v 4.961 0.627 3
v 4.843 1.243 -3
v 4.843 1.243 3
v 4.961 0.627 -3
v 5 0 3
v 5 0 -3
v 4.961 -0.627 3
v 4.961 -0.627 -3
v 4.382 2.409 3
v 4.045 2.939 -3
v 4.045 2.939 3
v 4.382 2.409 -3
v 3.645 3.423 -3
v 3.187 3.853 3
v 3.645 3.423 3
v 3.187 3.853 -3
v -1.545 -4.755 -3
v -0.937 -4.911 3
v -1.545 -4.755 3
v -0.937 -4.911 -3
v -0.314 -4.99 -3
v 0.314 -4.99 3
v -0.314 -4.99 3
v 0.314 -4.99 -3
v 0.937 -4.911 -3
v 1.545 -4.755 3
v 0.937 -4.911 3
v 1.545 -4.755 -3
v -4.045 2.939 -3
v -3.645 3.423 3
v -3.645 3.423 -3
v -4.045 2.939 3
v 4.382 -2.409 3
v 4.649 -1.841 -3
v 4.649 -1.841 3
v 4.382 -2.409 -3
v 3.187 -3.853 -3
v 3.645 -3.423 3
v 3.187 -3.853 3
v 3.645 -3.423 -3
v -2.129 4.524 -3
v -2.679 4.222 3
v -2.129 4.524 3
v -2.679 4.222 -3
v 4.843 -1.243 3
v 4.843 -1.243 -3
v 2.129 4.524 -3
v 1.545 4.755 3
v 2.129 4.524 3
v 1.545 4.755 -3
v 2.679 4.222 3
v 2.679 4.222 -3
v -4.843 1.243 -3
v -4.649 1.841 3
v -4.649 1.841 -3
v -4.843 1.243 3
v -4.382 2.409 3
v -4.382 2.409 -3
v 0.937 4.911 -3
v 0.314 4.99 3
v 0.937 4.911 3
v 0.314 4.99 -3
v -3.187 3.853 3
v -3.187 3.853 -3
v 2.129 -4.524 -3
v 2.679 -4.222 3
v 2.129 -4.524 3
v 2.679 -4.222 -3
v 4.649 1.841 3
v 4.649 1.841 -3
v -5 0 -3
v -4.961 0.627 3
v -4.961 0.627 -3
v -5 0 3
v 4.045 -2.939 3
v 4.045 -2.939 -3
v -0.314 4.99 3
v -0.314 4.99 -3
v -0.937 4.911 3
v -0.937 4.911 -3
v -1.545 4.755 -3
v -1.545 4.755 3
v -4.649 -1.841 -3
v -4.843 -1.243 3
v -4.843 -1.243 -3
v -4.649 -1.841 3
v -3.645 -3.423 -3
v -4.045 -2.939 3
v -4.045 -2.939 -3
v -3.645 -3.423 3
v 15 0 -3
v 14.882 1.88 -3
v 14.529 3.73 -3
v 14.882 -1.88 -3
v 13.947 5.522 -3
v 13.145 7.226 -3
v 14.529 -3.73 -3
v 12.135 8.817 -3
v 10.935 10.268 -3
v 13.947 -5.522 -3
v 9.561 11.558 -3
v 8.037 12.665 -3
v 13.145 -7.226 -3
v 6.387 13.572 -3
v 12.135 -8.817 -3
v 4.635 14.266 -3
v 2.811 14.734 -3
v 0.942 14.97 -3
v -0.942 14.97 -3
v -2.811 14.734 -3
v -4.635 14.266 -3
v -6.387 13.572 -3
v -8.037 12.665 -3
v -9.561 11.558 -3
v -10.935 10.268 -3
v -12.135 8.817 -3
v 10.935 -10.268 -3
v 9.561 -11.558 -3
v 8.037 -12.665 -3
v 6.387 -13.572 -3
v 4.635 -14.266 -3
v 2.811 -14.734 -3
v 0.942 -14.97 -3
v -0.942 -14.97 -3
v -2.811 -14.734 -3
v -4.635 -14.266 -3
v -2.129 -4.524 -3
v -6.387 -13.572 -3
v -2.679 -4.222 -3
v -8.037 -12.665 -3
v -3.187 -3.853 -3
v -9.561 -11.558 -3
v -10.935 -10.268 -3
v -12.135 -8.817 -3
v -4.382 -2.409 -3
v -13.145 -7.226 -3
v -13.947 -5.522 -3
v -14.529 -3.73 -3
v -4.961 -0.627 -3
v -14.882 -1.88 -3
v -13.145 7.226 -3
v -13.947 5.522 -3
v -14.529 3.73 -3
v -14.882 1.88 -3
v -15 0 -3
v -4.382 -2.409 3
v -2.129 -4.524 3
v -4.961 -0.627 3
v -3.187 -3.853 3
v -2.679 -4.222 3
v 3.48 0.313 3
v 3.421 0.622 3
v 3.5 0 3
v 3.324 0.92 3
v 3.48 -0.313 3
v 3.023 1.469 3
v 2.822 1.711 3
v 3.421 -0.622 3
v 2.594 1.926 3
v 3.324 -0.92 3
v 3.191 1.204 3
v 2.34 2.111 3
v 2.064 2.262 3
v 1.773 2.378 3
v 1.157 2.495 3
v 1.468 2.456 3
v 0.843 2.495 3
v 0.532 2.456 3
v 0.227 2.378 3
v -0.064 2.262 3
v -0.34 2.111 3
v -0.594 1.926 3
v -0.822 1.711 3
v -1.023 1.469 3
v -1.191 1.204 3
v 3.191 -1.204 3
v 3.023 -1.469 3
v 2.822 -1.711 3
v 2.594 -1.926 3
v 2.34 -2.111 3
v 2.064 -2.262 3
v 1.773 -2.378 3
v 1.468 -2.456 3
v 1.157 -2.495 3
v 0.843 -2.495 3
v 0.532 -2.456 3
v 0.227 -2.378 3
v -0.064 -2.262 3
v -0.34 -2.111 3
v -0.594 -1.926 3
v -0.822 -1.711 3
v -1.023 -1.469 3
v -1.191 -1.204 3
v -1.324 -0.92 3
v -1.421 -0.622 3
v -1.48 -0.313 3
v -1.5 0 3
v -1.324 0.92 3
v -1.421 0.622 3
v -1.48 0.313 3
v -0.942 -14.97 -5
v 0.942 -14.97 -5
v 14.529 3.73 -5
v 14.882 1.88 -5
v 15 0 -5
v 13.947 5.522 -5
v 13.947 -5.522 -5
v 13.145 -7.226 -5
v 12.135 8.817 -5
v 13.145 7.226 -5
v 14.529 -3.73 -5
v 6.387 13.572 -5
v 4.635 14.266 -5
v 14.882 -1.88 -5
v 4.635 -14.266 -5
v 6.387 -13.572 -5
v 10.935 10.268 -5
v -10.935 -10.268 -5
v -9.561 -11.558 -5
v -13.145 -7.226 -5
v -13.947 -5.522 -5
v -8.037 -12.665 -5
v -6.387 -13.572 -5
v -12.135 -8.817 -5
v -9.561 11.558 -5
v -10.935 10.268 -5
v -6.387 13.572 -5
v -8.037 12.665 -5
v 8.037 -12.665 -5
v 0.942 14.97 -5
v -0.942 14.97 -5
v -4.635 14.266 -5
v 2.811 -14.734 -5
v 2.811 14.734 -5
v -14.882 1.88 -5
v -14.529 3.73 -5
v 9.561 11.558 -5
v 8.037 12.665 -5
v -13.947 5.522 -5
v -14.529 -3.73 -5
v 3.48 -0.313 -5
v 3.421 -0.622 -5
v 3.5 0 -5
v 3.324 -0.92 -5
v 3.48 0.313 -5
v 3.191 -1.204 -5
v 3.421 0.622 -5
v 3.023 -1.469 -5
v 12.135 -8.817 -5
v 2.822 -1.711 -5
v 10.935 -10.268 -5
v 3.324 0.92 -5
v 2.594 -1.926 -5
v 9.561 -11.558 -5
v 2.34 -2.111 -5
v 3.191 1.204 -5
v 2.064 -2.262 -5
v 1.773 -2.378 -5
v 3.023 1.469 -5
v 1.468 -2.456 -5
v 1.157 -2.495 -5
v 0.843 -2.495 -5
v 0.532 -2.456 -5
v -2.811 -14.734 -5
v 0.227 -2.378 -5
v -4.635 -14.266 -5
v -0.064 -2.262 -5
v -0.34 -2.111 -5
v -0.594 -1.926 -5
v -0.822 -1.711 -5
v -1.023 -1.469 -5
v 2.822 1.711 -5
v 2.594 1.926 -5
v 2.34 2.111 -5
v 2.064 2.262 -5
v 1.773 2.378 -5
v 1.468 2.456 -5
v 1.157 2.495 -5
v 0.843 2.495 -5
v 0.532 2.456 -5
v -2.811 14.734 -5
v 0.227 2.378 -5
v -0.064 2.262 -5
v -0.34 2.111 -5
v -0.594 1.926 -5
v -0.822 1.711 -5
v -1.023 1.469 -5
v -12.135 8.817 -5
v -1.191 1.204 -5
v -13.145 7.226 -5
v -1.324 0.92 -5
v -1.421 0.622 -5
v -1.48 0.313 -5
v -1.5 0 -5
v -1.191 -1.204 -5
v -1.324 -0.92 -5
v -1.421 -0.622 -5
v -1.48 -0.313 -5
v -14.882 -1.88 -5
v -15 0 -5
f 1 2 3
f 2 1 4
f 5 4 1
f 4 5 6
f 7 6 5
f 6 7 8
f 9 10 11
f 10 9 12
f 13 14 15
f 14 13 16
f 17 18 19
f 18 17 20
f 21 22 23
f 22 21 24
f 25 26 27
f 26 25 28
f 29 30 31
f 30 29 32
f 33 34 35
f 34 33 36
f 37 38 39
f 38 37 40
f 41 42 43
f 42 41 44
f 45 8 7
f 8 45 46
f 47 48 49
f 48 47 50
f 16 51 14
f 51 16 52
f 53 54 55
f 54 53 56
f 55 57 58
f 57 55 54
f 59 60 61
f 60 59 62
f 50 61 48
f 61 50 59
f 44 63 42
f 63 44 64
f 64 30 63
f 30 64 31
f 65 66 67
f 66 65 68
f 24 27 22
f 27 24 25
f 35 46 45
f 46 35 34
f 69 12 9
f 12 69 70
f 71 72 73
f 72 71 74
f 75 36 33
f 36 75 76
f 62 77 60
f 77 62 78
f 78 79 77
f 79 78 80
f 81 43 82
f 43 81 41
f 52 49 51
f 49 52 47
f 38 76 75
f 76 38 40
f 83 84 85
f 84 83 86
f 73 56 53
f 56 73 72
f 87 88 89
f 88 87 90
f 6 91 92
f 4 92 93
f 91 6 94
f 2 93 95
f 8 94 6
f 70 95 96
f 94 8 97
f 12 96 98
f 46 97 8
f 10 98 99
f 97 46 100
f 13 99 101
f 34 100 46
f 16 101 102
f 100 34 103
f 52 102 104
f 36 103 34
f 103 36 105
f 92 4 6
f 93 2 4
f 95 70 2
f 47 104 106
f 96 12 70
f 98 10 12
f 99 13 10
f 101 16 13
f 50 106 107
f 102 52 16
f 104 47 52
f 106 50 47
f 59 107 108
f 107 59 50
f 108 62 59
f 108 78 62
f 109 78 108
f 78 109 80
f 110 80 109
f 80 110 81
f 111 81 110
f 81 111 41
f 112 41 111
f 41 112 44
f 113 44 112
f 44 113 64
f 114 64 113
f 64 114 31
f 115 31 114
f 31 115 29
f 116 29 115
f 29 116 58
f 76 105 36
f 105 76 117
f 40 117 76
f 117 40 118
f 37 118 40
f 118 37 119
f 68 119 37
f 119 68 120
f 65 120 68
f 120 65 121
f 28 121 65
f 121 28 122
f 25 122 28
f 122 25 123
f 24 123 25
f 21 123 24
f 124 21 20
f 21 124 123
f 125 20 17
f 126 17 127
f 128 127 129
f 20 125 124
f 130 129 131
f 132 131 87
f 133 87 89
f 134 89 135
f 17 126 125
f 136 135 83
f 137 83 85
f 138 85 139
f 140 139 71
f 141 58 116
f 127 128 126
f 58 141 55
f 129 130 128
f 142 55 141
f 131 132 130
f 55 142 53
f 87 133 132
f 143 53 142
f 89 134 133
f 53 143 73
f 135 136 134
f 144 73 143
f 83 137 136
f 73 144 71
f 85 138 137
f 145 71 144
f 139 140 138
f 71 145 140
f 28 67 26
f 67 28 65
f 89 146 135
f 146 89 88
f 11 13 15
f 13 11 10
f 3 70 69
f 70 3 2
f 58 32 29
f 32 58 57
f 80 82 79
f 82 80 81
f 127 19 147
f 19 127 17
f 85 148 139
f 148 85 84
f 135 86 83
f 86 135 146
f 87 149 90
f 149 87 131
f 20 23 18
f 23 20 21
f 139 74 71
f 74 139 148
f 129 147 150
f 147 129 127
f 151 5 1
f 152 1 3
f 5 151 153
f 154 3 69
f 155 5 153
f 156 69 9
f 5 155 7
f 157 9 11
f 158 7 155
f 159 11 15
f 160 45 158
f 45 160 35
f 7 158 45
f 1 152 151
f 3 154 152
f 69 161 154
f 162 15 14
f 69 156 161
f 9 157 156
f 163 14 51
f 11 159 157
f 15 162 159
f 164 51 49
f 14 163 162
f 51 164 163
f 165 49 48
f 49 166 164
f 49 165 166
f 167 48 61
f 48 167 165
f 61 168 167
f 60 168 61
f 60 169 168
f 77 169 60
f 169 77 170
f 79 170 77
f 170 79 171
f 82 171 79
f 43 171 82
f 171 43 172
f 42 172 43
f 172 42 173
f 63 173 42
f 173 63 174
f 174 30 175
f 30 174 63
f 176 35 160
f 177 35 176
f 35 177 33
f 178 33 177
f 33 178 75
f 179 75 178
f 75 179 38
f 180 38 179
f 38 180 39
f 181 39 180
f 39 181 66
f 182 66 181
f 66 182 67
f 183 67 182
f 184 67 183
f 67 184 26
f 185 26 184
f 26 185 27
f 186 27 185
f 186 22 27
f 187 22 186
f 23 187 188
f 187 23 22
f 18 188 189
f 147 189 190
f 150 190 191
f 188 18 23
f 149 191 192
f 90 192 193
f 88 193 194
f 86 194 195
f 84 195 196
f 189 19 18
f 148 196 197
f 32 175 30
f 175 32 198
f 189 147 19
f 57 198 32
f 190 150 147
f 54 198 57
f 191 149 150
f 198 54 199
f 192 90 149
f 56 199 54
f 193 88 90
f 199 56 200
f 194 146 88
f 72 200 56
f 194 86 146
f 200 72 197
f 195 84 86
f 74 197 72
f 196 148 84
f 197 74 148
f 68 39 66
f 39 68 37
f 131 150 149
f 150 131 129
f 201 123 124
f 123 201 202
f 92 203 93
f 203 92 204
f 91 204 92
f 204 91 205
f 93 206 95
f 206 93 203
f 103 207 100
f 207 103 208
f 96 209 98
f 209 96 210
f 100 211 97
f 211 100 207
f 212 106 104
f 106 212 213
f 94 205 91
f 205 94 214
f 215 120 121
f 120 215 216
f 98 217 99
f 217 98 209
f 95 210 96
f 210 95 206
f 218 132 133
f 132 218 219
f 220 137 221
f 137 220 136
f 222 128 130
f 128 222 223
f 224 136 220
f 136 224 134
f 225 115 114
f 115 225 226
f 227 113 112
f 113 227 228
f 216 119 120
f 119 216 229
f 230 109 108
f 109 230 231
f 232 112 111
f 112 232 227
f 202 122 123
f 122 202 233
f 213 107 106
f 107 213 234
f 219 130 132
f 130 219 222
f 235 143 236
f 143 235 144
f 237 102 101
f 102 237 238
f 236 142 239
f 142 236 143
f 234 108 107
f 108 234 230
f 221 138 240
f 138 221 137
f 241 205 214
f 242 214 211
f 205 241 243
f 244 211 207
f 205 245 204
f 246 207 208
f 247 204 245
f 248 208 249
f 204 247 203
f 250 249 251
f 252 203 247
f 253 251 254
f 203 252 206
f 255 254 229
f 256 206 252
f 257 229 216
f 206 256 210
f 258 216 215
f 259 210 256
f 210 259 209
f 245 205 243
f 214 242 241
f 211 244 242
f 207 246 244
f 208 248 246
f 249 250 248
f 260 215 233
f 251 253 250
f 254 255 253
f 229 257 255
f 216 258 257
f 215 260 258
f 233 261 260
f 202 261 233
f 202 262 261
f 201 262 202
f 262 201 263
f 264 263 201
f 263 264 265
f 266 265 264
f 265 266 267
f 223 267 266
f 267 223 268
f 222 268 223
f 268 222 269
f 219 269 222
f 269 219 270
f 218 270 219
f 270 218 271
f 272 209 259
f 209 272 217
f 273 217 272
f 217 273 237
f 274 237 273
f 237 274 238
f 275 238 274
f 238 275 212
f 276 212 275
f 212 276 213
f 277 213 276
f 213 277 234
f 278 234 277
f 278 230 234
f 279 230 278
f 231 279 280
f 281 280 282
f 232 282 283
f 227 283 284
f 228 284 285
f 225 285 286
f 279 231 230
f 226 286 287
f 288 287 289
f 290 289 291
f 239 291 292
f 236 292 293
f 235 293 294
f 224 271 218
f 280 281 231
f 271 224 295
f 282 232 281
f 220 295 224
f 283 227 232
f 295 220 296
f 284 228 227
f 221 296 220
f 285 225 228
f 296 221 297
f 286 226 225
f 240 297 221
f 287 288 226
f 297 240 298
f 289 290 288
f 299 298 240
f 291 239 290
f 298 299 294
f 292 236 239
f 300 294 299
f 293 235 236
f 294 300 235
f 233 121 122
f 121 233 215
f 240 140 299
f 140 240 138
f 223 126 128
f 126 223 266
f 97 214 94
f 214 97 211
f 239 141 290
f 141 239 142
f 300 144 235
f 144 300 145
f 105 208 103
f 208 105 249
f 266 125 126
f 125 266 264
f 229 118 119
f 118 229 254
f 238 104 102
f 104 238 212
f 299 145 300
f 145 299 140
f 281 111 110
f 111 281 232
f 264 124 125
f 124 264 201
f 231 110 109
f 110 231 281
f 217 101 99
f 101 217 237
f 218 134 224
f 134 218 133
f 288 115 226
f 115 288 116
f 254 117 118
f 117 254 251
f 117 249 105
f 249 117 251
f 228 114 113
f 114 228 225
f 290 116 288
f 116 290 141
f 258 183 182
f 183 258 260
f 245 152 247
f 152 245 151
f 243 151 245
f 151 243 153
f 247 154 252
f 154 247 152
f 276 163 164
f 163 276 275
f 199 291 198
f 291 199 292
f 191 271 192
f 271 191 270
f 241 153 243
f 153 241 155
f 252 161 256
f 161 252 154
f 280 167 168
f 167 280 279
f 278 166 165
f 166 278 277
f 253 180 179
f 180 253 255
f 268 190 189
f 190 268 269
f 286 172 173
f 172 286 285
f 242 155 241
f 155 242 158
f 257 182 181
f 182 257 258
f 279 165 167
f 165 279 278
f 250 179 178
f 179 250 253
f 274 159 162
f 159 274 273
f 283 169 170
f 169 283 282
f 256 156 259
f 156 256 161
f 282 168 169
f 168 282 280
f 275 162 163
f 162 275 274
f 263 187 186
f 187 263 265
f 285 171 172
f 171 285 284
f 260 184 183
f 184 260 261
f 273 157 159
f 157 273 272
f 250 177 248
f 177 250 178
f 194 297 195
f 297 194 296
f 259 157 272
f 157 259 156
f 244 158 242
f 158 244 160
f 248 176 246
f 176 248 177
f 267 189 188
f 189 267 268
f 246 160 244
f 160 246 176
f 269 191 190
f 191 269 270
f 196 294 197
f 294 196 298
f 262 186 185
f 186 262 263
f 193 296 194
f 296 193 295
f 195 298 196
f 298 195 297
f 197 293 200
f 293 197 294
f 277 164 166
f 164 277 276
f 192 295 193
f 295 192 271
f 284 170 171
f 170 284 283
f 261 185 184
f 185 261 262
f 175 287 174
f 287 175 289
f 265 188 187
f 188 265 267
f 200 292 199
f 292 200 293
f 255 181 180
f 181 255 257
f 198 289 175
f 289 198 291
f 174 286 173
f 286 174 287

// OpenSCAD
$fn=50;

difference() {
    union() {
        cylinder(d=10,h=6,center=true);
        translate([0,0,-4]) cylinder(d=30,h=2,center=true);
    }
    translate([1,0,0]) cylinder(d=5,h=50,center=true);
}
